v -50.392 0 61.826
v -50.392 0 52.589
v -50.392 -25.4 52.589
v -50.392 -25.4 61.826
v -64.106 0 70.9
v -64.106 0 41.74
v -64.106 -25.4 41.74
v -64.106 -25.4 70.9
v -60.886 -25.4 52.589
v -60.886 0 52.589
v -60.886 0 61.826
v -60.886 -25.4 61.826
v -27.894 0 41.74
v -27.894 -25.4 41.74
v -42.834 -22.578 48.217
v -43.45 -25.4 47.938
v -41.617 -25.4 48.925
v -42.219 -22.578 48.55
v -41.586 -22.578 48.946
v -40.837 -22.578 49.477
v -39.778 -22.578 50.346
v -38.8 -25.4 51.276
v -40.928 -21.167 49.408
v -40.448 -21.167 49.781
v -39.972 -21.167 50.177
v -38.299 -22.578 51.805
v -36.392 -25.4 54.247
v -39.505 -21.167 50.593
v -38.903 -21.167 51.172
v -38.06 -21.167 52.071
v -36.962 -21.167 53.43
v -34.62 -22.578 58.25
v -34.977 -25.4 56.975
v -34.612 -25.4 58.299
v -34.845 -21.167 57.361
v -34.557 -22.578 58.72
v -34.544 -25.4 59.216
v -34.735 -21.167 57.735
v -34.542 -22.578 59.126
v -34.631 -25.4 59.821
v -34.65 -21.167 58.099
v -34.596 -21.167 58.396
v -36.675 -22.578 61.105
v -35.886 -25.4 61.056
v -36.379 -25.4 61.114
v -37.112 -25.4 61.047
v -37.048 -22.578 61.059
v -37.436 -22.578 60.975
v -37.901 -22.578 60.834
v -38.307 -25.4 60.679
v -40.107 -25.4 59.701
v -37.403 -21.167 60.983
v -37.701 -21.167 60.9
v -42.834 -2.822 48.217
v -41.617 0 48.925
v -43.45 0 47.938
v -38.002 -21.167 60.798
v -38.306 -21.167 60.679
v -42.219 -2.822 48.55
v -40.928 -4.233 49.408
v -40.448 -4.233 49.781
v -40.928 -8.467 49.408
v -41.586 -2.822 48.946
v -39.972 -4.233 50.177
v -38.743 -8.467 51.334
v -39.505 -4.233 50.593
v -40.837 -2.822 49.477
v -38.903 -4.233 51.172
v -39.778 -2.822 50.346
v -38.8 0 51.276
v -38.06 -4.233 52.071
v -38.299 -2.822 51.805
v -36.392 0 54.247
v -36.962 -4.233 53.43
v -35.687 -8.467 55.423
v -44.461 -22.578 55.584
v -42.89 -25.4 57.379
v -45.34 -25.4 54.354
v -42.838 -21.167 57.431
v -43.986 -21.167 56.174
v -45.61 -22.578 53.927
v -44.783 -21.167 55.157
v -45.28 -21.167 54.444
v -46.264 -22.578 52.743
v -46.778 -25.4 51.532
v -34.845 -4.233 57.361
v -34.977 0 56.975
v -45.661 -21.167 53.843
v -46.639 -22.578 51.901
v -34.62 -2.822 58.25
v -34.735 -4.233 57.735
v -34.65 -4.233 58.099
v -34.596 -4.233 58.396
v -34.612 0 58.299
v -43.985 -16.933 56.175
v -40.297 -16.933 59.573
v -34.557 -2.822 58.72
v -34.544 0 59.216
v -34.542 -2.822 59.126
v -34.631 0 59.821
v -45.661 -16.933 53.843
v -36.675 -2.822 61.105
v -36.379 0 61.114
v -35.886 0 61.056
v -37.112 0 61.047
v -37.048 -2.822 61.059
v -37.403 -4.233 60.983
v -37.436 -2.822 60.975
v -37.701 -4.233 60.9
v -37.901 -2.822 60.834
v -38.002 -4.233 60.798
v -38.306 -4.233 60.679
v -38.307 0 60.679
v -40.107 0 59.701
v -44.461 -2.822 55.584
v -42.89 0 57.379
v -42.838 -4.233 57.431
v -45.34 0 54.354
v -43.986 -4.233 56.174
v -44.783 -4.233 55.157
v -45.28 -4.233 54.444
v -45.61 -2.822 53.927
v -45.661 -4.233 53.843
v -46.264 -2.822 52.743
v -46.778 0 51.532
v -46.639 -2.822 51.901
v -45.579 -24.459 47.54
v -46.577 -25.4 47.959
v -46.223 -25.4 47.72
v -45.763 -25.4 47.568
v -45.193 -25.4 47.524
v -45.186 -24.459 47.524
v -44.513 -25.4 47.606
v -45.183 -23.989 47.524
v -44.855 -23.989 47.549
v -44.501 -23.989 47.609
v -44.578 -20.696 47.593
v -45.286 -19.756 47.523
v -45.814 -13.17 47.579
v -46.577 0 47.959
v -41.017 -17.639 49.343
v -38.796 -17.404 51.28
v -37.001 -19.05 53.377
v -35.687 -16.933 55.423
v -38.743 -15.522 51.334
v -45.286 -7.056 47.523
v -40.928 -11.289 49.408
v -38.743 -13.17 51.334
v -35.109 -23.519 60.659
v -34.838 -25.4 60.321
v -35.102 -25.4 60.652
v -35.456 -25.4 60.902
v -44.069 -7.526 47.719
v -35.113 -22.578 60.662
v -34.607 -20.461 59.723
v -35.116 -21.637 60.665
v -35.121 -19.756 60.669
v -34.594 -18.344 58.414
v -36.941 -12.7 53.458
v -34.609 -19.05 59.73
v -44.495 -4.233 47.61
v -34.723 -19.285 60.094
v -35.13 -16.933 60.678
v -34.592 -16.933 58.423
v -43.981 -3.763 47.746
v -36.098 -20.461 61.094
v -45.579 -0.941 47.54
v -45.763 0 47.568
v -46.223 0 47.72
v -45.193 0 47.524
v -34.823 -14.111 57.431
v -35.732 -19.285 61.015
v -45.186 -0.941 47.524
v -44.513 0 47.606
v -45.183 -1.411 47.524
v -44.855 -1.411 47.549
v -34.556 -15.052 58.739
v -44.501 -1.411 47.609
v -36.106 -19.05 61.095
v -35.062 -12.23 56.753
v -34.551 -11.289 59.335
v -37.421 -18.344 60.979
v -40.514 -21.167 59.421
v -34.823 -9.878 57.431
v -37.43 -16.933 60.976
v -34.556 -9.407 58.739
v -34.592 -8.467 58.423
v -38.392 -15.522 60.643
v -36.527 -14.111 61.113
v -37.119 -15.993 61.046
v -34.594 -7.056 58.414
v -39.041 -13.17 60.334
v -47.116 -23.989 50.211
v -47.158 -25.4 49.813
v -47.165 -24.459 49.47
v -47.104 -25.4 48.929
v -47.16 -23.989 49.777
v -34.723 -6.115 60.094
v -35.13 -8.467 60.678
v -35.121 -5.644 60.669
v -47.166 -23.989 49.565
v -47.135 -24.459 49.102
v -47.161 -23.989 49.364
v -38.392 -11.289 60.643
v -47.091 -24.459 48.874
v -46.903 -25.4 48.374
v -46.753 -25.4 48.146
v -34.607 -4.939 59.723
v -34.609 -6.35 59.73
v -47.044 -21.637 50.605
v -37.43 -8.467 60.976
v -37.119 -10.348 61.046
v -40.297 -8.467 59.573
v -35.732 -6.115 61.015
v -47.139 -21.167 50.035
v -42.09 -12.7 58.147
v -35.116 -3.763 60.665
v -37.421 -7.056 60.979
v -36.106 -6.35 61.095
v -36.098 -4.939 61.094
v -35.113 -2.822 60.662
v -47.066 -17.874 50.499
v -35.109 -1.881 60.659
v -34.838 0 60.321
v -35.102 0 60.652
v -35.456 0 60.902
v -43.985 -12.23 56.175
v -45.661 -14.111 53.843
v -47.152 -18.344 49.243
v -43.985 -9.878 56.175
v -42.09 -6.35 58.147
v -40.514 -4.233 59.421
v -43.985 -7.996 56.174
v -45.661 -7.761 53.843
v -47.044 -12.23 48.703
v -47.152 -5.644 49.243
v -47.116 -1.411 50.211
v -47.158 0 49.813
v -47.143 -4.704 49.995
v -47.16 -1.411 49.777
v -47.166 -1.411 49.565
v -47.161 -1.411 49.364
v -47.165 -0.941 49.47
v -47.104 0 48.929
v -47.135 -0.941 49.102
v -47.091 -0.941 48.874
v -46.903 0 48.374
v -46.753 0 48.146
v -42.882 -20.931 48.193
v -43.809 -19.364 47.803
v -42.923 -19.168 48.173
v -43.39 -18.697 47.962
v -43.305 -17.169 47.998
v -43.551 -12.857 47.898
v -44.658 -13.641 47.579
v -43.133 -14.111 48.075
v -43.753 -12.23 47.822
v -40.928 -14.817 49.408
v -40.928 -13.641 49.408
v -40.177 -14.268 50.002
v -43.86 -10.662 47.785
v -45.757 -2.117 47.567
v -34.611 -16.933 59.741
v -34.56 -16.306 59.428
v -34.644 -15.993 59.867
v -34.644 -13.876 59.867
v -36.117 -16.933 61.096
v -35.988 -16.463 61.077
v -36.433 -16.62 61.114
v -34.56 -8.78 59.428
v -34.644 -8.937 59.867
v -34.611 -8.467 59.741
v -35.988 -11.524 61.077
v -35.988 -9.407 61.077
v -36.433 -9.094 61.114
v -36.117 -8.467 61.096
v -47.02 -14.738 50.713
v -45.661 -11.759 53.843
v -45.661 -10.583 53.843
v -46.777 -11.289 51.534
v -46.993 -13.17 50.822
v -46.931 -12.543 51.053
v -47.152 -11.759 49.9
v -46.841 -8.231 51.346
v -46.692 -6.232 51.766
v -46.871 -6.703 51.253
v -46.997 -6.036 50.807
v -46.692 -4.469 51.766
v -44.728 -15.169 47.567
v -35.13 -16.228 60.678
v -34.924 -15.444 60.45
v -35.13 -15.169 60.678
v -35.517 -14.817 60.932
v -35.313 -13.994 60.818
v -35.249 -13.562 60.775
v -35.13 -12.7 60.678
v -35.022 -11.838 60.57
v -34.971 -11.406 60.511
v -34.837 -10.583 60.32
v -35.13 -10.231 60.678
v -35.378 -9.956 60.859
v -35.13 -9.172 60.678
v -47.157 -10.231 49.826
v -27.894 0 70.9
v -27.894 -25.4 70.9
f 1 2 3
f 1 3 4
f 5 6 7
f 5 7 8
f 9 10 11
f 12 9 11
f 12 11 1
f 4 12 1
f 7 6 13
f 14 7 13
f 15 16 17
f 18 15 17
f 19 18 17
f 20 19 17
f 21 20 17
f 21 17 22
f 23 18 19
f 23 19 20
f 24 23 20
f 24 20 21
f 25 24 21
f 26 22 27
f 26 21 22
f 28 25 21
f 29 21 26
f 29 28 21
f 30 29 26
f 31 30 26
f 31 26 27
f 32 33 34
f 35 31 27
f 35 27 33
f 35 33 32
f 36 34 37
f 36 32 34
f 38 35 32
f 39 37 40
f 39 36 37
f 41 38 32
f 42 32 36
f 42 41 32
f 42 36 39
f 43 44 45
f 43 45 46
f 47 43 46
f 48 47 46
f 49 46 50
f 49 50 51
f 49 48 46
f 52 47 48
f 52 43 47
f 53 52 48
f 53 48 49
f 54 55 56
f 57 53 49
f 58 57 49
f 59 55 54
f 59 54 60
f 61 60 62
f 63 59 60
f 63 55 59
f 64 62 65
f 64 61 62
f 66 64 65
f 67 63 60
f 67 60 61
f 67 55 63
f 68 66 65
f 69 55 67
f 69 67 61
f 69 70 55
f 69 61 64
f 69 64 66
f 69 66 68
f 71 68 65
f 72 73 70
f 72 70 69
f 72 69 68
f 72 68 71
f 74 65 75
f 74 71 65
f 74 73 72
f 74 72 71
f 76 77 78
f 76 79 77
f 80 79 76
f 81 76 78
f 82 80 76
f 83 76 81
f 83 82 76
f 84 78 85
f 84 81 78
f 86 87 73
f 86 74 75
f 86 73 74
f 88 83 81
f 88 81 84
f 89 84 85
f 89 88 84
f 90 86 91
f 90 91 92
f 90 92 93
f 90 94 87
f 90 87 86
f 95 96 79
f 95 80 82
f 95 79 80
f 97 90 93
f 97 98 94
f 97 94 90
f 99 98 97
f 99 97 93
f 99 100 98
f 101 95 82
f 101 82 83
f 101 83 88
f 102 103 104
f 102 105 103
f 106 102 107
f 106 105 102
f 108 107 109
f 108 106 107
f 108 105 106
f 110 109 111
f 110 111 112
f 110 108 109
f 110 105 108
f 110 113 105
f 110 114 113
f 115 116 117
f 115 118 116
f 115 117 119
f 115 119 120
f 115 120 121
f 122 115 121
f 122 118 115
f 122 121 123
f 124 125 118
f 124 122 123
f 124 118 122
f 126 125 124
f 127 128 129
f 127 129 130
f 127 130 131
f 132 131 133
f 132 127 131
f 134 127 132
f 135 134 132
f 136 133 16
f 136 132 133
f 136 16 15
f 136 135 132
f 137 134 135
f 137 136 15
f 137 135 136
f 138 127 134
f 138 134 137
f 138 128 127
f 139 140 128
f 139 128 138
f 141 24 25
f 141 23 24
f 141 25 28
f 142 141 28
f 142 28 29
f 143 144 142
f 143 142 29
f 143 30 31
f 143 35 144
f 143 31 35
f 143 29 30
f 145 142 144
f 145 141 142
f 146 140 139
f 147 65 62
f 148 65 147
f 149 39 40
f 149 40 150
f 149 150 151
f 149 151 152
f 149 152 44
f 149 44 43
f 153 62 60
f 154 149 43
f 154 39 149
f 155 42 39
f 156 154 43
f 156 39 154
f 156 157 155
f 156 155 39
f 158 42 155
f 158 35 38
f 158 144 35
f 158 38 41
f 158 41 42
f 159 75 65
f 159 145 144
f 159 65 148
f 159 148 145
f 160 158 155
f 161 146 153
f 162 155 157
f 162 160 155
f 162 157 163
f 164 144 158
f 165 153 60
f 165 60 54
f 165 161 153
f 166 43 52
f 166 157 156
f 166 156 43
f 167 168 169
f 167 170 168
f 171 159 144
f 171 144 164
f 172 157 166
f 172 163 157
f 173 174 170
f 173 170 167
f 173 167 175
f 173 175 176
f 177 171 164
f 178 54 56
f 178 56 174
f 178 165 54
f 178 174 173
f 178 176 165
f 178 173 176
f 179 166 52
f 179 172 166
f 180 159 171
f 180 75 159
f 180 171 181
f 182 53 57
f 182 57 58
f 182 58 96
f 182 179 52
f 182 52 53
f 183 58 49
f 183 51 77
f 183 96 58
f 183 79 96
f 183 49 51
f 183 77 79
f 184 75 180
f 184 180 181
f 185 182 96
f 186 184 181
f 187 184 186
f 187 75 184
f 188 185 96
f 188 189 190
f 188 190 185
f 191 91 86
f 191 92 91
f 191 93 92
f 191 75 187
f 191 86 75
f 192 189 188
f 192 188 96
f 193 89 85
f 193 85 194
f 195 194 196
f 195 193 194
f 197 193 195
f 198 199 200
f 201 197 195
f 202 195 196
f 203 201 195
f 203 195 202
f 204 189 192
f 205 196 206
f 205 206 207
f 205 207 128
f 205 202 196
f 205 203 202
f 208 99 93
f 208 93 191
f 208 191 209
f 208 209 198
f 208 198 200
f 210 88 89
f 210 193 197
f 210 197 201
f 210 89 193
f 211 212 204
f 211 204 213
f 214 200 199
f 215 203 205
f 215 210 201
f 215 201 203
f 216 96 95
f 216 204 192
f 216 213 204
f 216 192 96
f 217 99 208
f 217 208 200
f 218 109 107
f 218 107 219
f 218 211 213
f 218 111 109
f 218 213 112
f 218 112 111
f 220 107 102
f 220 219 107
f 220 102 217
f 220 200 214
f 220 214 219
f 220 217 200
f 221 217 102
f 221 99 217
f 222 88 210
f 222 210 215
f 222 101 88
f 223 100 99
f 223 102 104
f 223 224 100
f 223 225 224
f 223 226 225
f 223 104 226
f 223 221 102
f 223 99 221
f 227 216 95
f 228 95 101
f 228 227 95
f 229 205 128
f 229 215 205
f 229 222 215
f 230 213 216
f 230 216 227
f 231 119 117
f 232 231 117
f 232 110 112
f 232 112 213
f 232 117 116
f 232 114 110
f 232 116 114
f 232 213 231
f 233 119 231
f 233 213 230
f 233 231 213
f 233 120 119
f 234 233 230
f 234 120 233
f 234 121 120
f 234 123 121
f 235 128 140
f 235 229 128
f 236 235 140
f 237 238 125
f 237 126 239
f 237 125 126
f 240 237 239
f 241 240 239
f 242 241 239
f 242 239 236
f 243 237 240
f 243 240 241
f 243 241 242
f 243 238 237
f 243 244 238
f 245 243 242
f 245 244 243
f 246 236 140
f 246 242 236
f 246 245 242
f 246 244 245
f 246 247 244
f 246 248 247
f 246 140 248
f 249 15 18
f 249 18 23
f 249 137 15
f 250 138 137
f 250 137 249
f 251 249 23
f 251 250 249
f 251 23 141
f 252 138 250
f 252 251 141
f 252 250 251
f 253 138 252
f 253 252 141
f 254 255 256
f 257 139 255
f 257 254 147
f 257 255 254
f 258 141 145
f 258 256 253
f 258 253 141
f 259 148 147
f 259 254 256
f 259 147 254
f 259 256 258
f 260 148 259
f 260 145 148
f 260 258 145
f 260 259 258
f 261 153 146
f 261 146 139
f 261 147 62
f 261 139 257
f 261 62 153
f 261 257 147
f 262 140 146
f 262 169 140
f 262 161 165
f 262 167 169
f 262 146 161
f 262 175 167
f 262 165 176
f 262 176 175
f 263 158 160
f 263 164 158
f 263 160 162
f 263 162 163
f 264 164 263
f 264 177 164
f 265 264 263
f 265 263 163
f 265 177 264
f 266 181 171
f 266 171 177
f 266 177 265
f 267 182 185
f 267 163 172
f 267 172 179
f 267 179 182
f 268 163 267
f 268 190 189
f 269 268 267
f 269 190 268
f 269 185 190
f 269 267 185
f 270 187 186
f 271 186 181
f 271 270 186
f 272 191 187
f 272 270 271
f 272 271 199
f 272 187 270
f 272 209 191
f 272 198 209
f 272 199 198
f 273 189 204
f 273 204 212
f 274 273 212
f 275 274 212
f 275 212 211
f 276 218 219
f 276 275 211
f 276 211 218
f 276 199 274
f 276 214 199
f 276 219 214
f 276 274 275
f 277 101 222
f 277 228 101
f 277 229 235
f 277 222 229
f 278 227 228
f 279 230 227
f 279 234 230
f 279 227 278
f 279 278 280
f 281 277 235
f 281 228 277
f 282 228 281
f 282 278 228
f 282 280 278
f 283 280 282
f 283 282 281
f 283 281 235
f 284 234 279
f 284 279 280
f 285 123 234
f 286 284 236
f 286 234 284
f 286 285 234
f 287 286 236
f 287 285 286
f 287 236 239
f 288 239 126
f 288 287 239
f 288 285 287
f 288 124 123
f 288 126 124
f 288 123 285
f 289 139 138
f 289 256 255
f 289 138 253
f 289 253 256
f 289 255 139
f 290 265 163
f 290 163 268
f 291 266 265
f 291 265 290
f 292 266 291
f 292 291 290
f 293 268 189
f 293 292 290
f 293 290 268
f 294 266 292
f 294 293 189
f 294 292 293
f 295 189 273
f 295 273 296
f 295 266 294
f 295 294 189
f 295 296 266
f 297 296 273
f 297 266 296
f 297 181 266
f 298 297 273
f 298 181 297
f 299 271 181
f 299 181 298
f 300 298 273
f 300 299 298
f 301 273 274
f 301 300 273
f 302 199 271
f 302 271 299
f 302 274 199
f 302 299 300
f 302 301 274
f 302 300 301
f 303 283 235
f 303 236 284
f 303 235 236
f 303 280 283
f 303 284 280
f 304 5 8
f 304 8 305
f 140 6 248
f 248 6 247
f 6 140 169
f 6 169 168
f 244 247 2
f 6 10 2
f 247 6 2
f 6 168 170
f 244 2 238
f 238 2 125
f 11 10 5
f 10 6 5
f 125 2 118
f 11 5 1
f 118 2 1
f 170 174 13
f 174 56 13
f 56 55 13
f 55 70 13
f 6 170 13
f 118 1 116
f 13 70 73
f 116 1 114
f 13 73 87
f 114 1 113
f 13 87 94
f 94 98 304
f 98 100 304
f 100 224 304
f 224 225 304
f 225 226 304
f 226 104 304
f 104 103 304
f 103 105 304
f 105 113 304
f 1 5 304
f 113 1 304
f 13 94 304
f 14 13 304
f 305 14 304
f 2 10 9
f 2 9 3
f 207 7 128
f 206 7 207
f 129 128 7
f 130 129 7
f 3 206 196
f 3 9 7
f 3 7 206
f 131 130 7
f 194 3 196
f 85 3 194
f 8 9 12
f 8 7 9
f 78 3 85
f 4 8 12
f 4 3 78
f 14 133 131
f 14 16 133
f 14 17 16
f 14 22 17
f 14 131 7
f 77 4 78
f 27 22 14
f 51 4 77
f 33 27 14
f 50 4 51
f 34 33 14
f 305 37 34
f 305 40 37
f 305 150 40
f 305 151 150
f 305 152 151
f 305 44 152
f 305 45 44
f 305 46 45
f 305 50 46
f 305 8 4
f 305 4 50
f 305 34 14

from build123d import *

# Parameters (mm, degrees)
F0_W     = 36.21218
F0_H     = 29.160332
F0_W_2   = 10.49491
F0_H_2   = 9.236813
F1_DEPTH = 25.4


with BuildPart() as f1:
    # F0 (on Front) → F1 (new body)
    with BuildSketch(Plane.XZ):
        with Locations((-45.999823, 56.319715)):
            Rectangle(F0_W, F0_H)
        with BuildLine():
            add(Edge.make_bspline(
                [(-46.577437, 47.959008), (-41.966774, 43.809412), (-35.686771, 55.423475), (-29.406767, 67.037537), (-40.297434, 59.57307), (-51.1881, 52.108603), (-46.577437, 47.959008)],
                knots=[0, 0, 0, 2.094395, 2.094395, 4.18879, 4.18879, 6.283185, 6.283185, 6.283185], degree=2, weights=[1, 0.5, 1, 0.5, 1, 0.5, 1]))
        make_face(mode=Mode.SUBTRACT)
        with Locations((-55.639032, 57.207502)):
            Rectangle(F0_W_2, F0_H_2, mode=Mode.SUBTRACT)
    extrude(amount=F1_DEPTH)


solid = f1.part
